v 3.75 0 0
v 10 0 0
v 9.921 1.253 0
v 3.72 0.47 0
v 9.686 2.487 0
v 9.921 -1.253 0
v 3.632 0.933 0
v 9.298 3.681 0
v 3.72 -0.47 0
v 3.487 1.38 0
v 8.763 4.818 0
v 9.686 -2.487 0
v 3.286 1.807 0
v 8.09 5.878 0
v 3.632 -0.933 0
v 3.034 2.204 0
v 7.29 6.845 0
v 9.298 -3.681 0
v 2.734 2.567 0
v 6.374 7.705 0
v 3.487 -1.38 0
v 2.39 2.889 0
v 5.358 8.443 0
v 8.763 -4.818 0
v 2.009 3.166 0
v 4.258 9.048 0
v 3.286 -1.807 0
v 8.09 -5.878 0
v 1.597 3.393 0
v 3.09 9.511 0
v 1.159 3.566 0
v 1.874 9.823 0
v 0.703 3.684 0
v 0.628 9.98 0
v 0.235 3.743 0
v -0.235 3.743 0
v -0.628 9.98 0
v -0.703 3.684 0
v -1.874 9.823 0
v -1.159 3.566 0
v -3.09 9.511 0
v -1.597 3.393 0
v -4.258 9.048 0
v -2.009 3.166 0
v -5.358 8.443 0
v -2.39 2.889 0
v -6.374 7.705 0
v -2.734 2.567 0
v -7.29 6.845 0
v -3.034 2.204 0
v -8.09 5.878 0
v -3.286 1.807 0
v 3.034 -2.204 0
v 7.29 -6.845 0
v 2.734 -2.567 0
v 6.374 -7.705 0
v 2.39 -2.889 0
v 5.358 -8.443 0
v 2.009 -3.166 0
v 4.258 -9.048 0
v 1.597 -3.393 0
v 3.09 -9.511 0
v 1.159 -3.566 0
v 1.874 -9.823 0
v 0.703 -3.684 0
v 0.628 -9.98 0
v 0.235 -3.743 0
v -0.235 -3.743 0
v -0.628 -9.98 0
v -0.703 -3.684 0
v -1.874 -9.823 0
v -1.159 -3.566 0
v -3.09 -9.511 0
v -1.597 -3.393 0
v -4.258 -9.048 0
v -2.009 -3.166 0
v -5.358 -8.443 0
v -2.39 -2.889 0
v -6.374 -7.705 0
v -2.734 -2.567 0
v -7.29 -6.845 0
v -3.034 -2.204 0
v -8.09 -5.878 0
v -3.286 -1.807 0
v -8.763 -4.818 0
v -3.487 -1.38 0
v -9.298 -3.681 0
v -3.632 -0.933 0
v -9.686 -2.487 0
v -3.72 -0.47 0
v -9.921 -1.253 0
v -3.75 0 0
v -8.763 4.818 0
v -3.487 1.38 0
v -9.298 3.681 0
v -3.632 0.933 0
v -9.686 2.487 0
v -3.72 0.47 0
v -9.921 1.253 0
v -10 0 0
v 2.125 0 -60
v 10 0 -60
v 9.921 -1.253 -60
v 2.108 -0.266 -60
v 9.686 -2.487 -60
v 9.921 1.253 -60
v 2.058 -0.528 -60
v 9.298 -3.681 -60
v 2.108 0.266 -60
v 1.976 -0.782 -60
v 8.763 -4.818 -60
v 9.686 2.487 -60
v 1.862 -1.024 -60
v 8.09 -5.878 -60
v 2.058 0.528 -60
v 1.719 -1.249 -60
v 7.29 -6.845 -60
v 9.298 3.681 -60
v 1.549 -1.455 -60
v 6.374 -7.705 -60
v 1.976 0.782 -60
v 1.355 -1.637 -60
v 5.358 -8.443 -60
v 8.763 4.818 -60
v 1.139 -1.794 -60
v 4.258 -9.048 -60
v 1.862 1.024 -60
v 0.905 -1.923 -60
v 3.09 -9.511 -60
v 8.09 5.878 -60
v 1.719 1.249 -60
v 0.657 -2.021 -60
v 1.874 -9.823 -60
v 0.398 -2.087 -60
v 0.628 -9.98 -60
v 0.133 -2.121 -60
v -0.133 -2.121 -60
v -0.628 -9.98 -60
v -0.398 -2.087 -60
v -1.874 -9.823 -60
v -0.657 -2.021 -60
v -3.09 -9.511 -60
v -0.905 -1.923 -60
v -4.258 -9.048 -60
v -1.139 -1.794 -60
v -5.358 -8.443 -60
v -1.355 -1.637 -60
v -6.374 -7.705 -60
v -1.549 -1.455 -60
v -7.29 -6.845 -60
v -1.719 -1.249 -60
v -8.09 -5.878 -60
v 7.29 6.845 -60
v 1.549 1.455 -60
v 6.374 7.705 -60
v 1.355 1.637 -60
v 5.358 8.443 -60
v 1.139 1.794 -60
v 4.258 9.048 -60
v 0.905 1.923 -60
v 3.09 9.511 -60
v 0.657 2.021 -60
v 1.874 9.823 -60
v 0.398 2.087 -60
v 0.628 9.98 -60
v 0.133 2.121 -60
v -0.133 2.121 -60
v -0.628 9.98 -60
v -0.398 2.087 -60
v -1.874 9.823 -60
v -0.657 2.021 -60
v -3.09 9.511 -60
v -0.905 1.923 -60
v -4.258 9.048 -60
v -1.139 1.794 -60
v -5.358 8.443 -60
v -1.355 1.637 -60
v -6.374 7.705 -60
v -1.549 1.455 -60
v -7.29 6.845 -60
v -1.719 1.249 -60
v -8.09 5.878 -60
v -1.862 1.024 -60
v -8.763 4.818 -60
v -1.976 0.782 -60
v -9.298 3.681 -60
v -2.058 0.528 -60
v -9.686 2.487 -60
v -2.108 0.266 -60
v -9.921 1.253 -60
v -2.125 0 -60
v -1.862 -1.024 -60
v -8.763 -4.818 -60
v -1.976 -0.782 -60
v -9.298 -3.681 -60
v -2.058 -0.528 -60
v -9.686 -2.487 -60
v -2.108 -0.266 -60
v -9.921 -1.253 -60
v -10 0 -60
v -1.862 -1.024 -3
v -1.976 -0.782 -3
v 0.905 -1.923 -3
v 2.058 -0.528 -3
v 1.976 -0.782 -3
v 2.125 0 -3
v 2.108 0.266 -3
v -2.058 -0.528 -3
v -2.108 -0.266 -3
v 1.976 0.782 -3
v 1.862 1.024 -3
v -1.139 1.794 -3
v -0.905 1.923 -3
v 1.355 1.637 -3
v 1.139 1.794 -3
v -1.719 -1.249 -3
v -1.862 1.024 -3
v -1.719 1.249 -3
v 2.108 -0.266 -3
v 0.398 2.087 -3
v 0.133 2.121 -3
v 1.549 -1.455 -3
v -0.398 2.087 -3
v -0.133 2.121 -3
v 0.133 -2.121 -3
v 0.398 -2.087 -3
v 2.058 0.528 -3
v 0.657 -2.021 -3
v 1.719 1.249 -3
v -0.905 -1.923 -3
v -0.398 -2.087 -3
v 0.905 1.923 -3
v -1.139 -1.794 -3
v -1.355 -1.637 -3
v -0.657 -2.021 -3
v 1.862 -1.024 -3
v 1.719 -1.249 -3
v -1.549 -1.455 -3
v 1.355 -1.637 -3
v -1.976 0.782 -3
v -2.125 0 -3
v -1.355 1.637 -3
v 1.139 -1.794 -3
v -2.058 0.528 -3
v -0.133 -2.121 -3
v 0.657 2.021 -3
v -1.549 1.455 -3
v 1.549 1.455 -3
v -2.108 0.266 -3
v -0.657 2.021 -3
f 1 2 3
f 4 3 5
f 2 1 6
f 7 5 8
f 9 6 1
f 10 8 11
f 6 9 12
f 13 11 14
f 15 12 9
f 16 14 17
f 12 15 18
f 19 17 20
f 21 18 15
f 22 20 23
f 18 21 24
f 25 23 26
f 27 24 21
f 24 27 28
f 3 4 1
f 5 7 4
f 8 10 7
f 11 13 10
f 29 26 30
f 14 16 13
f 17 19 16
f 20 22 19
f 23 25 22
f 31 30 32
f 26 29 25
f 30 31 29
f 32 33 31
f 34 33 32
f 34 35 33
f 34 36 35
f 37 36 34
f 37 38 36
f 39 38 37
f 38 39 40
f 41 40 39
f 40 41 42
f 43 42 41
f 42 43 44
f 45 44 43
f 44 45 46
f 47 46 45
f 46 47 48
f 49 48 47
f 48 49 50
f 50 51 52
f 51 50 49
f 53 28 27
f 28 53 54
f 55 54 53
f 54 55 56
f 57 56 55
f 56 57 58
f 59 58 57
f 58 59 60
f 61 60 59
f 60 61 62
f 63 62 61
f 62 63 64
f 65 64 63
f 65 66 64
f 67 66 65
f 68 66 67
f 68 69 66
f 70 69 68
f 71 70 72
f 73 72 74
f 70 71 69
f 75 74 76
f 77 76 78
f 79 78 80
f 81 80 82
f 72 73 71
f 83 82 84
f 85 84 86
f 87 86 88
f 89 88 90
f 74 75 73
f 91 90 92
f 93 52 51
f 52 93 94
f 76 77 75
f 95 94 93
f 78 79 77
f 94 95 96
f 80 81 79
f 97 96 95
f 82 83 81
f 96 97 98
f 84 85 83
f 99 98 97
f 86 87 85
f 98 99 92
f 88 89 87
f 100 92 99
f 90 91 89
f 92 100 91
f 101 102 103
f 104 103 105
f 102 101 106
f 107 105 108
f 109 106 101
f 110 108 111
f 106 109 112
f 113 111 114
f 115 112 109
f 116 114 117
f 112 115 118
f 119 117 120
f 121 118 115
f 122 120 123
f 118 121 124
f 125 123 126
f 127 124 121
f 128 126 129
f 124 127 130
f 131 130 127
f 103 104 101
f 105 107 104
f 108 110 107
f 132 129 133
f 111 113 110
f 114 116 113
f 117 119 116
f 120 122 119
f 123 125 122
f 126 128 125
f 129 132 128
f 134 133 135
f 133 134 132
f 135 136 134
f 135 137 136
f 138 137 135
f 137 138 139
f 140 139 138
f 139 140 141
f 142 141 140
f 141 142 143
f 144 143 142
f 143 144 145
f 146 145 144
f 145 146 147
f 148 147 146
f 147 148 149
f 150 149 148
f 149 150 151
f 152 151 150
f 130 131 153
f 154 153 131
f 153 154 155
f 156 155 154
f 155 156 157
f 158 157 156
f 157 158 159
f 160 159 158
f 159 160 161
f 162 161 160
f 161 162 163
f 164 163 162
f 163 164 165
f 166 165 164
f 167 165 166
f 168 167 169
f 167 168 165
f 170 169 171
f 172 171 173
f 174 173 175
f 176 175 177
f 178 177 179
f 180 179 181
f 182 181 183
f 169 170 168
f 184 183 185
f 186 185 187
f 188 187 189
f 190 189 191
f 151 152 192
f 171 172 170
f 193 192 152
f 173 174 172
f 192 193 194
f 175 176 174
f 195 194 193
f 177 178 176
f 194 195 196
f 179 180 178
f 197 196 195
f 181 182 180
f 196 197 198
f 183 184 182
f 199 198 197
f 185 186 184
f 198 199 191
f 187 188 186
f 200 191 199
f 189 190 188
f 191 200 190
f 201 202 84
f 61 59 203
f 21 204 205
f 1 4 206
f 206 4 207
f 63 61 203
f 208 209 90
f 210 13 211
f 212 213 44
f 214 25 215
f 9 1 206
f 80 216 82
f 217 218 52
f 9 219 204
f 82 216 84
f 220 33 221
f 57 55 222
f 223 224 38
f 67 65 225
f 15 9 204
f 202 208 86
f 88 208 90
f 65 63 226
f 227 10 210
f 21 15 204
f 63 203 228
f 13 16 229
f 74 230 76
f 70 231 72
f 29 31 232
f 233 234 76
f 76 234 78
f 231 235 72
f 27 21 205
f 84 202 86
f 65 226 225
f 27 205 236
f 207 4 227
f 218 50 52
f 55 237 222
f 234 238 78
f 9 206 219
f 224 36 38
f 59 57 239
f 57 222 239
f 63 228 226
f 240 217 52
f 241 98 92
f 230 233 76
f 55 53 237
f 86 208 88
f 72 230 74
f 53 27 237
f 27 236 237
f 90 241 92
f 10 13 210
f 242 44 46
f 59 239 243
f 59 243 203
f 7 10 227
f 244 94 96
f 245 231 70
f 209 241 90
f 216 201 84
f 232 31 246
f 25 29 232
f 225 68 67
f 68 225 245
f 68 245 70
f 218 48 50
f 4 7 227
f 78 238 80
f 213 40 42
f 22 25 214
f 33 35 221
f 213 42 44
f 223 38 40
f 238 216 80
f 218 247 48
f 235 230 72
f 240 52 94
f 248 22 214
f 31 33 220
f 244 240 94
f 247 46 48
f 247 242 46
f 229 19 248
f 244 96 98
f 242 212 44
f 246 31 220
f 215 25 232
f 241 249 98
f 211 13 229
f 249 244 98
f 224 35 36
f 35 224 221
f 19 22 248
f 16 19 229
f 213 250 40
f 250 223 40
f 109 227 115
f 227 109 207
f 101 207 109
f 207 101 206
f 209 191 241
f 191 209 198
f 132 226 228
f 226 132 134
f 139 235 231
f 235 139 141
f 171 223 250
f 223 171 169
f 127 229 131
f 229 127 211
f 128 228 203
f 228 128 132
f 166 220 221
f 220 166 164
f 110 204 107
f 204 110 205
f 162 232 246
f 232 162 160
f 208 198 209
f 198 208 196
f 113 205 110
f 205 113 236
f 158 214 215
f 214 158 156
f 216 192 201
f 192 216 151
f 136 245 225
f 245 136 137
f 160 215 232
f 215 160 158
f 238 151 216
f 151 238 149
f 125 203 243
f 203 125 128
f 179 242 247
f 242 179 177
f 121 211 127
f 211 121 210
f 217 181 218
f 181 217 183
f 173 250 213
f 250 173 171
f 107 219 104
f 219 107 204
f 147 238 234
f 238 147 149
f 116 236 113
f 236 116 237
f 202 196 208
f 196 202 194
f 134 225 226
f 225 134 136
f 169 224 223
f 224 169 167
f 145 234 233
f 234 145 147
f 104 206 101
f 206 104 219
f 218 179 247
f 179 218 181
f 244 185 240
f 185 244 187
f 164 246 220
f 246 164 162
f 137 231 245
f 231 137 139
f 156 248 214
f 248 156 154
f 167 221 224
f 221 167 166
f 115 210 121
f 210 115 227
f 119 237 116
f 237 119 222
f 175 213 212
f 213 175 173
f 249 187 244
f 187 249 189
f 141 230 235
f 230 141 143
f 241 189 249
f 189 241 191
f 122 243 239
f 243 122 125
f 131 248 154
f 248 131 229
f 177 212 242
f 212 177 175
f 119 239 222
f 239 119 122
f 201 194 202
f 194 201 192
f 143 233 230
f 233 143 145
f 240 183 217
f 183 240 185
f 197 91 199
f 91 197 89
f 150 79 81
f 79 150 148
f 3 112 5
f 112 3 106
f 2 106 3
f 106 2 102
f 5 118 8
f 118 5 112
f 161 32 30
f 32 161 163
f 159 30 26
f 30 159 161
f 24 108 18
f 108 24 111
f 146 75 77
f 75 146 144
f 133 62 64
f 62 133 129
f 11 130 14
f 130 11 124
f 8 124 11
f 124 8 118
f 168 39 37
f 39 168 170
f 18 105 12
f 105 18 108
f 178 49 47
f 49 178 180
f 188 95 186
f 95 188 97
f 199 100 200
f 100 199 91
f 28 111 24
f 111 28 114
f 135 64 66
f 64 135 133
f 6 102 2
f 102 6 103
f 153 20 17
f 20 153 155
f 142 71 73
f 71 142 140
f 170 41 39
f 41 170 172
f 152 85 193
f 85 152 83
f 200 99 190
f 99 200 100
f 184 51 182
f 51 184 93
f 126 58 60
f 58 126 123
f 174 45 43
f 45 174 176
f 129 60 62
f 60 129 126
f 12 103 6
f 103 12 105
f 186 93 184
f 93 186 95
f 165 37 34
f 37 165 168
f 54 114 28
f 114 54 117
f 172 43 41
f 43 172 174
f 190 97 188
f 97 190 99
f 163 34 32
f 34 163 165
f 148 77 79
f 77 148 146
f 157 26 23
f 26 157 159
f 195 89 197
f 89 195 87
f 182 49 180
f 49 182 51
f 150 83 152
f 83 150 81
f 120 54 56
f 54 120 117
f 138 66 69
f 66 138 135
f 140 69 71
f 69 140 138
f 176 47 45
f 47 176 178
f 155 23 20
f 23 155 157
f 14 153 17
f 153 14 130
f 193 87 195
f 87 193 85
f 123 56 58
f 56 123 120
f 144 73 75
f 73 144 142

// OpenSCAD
$fn = 50;


difference() {
	union() {
		translate(v = [0, 0, -60.0000000000]) {
			cylinder(h = 60, r = 10.0000000000);
		}
		cylinder(h = 0, r = 16.0000000000);
	}
	union() {
		translate(v = [0, 0, 0]) {
			rotate(a = [0, 0, 0]) {
				difference() {
					union() {
						#translate(v = [0, 0, -60.0000000000]) {
							cylinder(h = 60, r = 2.0000000000);
						}
						#translate(v = [0, 0, -3]) {
							cylinder(h = 3, r = 10.0000000000, r1 = 2.1250000000, r2 = 3.7500000000);
						}
						#translate(v = [0, 0, -60.0000000000]) {
							cylinder(h = 60, r = 2.1250000000);
						}
						#translate(v = [0, 0, -60.0000000000]) {
							cylinder(h = 60, r = 2.0000000000);
						}
					}
					union();
				}
			}
		}
	}
}
